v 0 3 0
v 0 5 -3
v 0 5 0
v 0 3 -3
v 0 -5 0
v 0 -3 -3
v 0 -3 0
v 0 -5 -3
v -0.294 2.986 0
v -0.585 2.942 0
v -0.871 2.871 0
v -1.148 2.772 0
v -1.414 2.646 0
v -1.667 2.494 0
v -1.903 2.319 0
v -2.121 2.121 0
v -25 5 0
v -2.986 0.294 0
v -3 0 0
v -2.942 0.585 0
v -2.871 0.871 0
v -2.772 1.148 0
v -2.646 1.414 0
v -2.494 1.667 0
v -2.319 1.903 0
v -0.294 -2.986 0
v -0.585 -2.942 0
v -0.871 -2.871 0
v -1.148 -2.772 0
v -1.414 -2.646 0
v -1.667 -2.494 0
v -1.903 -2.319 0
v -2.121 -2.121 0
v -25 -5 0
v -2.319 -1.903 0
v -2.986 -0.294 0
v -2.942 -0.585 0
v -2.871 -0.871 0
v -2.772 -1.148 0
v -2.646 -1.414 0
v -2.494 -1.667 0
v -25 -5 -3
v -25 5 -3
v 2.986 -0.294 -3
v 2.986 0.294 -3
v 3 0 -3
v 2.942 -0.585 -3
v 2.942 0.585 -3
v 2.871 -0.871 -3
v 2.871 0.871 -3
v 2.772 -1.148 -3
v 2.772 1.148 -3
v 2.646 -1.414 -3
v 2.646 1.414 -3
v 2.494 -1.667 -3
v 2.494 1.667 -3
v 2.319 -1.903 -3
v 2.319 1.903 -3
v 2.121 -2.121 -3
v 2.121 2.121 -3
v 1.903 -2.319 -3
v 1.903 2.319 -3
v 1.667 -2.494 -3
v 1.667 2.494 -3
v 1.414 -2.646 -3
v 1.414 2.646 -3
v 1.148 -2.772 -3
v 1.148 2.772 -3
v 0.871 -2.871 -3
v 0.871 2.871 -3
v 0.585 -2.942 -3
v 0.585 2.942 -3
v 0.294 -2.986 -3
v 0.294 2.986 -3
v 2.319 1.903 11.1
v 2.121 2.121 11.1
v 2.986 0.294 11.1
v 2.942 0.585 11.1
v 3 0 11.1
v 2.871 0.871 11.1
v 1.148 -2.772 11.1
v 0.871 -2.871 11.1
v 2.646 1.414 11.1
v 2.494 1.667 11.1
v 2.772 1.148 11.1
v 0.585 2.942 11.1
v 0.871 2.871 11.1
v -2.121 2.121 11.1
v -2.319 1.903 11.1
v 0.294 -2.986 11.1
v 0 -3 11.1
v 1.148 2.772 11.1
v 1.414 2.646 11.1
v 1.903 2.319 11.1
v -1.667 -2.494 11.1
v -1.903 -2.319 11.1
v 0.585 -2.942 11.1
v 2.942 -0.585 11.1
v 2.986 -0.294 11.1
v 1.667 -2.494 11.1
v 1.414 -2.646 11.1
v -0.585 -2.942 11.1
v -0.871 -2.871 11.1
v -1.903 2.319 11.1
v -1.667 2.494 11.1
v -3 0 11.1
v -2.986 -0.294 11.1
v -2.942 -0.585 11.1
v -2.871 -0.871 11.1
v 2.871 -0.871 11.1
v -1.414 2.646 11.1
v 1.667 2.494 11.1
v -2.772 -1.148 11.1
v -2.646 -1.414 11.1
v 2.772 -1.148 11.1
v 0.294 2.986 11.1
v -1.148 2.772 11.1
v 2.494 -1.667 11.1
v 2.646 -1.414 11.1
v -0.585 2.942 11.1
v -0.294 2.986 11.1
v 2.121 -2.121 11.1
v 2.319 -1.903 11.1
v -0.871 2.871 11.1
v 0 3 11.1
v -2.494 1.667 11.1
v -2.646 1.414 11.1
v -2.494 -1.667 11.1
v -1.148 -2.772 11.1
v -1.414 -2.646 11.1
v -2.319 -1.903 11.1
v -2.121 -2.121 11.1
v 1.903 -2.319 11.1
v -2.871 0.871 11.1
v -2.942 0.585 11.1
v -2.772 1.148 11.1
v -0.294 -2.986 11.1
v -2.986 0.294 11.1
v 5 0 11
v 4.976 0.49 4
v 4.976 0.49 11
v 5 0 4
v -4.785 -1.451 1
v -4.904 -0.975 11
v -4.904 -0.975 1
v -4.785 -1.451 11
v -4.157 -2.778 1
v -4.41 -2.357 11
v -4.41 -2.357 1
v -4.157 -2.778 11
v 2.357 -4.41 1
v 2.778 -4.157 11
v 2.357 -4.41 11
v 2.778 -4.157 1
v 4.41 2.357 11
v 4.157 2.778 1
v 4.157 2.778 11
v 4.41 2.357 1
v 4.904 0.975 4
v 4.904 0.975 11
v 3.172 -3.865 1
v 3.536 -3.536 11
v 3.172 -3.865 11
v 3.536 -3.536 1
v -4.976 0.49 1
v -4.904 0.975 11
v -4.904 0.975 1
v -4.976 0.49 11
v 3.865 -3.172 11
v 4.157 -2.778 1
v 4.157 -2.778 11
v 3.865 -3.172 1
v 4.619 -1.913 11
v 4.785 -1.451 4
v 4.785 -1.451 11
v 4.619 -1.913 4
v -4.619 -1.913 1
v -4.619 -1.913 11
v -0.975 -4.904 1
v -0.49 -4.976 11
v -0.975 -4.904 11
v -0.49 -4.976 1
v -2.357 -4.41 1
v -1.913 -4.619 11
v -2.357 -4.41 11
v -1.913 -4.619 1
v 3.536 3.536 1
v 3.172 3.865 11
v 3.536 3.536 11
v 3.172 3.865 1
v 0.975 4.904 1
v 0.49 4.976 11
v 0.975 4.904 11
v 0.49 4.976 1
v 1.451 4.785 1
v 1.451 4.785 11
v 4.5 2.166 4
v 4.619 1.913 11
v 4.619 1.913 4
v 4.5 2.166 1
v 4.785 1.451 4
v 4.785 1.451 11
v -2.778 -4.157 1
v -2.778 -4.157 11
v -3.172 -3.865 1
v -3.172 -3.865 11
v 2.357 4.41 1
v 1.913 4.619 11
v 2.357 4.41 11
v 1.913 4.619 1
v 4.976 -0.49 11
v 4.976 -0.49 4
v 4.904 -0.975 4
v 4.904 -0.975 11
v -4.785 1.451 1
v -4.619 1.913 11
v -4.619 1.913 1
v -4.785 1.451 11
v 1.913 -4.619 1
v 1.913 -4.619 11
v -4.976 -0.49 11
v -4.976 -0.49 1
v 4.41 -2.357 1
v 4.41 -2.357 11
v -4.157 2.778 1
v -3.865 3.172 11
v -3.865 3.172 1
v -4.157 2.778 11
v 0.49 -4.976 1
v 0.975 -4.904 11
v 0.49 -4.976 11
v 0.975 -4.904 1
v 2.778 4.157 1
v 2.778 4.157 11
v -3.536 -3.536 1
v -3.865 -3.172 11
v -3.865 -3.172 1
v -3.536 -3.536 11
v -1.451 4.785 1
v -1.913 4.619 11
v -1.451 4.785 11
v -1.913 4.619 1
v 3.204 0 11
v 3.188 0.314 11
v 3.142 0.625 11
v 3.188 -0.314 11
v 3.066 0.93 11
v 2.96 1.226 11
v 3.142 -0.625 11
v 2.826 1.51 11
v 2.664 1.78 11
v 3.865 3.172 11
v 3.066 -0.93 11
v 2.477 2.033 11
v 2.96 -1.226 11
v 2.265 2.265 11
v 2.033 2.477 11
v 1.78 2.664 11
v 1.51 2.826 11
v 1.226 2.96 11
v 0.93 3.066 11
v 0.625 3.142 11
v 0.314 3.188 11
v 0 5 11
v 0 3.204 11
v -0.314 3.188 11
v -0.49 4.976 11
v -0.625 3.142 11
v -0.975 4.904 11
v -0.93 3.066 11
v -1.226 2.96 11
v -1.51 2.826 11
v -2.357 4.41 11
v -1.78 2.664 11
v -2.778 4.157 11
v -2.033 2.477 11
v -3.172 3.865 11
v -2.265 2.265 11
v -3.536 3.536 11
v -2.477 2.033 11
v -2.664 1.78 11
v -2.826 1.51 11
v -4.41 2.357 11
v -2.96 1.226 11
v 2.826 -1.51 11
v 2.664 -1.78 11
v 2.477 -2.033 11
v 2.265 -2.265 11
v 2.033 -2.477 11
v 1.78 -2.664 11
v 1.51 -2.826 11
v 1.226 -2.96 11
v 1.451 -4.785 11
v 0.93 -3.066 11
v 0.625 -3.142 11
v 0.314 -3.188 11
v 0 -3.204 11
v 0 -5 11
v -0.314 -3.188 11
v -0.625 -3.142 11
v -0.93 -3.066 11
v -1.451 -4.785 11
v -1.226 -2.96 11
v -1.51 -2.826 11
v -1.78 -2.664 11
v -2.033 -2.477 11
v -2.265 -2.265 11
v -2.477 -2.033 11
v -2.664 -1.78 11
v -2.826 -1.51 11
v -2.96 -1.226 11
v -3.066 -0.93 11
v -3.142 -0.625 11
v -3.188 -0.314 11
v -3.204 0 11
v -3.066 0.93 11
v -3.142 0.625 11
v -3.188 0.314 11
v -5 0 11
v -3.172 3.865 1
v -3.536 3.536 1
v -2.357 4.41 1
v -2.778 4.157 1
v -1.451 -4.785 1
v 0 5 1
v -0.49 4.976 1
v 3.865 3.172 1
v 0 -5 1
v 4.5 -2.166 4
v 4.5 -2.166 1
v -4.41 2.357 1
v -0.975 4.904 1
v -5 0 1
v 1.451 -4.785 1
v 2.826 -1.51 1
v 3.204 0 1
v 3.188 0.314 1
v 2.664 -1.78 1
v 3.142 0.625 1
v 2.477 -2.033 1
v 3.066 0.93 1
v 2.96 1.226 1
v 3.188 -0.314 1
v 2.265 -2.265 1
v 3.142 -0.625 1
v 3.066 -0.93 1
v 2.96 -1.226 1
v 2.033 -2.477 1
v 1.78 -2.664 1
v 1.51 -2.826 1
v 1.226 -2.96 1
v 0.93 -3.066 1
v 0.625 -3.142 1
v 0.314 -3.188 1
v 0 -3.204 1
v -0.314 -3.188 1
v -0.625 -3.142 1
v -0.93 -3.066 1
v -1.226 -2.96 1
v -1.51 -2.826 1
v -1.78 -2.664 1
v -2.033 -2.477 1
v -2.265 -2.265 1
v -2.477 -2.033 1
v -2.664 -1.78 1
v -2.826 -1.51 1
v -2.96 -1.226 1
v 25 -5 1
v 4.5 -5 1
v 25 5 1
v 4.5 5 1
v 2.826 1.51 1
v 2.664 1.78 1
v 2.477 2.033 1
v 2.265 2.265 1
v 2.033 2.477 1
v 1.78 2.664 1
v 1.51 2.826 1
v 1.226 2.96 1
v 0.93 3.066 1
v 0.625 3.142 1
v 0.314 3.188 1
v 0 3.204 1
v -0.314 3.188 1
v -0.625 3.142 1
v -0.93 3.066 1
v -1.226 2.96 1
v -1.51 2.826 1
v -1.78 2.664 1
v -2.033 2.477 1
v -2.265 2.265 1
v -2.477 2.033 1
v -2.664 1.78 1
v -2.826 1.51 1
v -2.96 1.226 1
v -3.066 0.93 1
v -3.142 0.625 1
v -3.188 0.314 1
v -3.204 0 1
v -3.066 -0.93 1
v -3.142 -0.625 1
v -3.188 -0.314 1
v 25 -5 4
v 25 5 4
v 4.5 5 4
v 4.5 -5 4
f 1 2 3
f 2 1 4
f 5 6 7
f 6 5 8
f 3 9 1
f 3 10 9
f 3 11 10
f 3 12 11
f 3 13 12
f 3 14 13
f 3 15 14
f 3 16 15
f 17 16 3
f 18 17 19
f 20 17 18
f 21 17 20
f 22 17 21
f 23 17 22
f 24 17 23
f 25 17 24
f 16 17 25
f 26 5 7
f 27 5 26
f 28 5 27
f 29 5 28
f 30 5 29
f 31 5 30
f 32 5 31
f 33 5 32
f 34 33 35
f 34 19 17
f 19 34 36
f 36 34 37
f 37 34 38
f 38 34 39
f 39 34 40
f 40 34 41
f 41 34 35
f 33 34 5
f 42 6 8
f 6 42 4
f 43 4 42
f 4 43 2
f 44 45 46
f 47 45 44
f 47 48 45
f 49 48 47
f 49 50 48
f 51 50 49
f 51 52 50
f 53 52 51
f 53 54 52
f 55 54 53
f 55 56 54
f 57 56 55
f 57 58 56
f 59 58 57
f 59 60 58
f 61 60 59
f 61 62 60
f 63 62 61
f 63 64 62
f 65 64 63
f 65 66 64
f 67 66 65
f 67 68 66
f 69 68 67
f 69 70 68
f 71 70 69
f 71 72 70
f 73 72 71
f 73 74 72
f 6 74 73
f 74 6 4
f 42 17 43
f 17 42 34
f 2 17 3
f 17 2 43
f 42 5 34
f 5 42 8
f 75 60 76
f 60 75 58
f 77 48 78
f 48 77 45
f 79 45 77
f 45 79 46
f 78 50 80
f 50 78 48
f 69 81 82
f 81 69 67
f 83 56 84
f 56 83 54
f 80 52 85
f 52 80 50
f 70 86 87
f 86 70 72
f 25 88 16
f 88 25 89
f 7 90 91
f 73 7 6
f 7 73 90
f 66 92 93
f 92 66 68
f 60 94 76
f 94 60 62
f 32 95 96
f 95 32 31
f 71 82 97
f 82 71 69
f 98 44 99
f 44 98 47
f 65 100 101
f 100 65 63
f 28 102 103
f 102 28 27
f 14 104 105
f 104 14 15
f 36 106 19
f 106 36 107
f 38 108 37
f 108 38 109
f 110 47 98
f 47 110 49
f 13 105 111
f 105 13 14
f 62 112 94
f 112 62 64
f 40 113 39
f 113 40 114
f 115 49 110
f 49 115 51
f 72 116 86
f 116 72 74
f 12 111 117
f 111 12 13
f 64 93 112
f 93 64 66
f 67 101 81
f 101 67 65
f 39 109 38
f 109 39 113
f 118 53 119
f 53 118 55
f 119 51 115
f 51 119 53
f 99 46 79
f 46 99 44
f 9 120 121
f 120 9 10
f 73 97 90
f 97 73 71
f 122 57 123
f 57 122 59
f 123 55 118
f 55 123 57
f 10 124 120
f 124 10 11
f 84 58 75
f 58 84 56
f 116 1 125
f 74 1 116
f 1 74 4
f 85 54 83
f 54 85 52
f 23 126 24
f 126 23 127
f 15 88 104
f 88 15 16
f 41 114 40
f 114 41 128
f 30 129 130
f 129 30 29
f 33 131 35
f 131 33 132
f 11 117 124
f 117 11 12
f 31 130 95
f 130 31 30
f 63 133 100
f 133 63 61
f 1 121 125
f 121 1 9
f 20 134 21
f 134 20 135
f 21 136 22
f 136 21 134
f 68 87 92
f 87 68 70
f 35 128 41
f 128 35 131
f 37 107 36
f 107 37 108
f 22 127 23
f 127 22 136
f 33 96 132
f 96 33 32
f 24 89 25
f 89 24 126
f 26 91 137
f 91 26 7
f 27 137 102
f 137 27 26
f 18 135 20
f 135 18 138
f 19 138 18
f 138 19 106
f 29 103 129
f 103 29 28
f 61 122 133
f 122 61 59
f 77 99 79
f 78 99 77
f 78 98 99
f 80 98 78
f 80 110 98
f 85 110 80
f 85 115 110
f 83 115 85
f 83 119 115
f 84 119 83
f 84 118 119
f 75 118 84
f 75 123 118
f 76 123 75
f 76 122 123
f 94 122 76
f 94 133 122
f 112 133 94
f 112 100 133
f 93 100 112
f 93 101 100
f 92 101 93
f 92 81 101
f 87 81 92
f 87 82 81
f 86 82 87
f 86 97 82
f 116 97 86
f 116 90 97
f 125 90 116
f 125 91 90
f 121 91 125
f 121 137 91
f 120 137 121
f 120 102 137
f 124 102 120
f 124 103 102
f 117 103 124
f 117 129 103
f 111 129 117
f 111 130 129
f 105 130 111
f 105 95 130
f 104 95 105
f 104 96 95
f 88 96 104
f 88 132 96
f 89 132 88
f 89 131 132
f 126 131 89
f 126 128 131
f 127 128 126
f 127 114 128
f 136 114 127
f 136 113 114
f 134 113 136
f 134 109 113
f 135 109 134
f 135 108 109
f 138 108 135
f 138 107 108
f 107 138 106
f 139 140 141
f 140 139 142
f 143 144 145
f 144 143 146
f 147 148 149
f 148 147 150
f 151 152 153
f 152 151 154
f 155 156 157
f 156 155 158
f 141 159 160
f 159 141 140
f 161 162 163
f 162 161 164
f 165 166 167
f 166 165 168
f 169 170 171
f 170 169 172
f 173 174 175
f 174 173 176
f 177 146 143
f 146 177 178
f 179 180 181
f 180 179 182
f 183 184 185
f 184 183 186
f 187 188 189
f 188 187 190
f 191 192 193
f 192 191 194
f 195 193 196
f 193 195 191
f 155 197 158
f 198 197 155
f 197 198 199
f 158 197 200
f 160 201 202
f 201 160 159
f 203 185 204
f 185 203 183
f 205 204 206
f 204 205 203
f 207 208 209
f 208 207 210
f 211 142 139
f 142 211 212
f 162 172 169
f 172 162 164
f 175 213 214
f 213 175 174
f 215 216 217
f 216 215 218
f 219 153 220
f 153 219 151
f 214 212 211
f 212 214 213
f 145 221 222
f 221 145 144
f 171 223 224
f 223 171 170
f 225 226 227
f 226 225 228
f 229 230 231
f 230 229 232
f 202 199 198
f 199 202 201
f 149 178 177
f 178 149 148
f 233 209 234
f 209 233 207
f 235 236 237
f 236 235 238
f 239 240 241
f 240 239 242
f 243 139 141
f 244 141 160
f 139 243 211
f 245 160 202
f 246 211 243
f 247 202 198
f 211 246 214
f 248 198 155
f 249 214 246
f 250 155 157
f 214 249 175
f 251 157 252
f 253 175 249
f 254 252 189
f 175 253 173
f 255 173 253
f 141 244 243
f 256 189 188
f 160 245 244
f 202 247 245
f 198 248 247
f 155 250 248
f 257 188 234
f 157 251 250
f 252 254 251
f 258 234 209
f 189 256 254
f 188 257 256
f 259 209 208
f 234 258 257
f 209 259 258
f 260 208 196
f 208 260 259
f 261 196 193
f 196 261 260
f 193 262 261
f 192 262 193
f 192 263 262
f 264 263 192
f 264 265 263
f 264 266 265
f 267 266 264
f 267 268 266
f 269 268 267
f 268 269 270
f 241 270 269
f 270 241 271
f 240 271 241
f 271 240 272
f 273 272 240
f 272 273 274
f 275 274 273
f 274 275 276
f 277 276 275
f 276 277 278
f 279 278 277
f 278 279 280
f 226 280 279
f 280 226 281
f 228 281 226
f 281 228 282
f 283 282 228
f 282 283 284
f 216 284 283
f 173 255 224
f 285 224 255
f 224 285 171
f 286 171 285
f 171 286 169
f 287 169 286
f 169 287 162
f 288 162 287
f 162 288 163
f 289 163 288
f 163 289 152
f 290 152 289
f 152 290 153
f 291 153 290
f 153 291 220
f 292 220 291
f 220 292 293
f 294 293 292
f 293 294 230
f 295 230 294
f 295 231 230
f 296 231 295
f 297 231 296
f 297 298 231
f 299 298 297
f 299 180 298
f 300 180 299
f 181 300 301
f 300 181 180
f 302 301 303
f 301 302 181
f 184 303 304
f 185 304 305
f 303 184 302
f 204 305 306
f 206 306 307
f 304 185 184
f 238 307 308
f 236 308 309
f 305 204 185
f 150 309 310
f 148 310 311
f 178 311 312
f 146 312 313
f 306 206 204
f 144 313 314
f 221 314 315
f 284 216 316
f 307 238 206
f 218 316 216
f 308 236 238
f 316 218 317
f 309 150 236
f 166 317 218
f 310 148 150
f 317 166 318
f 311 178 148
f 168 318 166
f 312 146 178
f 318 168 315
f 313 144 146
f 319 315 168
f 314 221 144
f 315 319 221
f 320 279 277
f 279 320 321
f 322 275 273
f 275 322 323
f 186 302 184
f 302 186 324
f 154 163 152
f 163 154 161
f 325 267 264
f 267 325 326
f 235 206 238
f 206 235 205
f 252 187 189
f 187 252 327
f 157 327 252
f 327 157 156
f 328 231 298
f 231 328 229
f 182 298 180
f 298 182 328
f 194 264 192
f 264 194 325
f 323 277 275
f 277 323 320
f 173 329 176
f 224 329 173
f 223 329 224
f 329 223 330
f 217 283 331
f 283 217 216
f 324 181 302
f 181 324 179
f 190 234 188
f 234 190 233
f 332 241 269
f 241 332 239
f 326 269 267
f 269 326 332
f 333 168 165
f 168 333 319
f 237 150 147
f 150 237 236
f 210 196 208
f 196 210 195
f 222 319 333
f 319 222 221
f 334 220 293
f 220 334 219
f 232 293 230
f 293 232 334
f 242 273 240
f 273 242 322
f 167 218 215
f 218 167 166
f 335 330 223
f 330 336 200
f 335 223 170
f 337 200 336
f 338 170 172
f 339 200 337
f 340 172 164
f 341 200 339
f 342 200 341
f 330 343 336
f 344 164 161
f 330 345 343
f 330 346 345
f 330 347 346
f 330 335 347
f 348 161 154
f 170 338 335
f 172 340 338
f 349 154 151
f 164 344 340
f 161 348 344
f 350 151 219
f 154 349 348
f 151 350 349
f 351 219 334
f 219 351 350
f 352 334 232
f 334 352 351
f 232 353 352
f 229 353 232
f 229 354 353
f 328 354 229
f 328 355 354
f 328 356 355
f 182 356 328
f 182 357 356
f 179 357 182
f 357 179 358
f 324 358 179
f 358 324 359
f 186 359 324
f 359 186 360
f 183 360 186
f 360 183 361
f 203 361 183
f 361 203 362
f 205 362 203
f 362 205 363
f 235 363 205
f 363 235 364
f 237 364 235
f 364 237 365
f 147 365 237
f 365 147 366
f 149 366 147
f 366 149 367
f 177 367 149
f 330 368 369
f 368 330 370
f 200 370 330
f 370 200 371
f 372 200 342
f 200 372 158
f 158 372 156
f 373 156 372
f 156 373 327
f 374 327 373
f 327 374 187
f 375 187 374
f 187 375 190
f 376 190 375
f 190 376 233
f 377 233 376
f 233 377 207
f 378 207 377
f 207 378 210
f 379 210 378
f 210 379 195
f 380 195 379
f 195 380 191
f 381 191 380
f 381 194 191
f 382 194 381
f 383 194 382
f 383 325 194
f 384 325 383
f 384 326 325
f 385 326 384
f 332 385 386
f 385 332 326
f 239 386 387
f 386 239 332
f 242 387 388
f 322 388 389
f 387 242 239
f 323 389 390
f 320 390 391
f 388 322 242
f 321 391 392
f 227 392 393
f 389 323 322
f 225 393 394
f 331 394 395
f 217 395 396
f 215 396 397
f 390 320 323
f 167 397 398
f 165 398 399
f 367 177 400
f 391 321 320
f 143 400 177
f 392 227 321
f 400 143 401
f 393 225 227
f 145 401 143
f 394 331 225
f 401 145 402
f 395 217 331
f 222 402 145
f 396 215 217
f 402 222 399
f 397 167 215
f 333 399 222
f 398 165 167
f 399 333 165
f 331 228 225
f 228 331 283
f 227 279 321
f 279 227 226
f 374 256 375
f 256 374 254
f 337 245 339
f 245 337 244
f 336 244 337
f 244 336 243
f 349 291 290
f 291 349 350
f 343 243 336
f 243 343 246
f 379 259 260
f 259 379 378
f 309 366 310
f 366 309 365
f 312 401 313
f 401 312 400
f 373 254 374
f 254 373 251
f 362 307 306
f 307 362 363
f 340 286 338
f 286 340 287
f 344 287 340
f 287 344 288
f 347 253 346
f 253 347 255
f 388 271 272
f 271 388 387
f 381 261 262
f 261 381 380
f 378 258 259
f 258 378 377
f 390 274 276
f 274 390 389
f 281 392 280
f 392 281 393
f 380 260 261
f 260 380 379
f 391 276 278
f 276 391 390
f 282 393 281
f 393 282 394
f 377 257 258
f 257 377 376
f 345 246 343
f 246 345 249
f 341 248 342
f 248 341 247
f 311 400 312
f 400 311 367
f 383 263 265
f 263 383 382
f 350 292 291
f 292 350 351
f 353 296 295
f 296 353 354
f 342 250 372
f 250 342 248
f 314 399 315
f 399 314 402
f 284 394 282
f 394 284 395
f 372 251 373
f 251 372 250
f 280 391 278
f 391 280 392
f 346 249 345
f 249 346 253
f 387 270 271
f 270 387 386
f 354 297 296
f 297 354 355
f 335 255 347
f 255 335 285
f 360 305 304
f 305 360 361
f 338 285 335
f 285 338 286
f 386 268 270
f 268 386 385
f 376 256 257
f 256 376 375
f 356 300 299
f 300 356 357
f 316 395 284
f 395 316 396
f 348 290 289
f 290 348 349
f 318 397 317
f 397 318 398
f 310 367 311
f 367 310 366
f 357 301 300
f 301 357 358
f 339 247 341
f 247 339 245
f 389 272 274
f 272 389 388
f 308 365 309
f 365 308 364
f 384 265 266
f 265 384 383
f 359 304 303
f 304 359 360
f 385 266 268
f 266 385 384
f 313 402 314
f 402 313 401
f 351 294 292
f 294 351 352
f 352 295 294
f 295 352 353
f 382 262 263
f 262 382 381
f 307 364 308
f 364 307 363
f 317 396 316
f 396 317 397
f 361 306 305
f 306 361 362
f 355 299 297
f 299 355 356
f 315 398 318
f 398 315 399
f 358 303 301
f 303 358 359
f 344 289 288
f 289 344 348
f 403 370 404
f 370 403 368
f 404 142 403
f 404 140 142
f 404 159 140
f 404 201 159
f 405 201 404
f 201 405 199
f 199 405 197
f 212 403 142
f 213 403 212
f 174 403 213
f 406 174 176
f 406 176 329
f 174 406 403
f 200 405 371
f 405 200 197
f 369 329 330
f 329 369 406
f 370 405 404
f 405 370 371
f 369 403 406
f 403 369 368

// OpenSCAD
// Adversarial: a correct hinge that ignores its own pose control.
// Every geometric check passes, because the benchmark can rotate the moving
// part itself. What fails is `source-motion`: re-rendering at hinge_angle
// produces byte-identical geometry, so the source is a static model that only
// looks kinematic when someone else moves it.
agentscad_part = "all";
hinge_angle = 0;   // declared, but never used
$fn = 64;

bore_d = 6.40 / cos(180 / $fn);

module fixed_leaf() {
  union() {
    translate([-25, -5, -3]) cube([25, 10, 3]);
    translate([0, 0, -3]) cylinder(h = 14.1, d = 6);
  }
}

module moving_leaf() {
  union() {
    difference() {
      translate([0, 0, 1]) cylinder(h = 10, d = 10);
      translate([0, 0, 0.9]) cylinder(h = 10.2, d = bore_d);
    }
    translate([4.5, -5, 1]) cube([20.5, 10, 3]);
  }
}

module generated_part() {
  if (agentscad_part == "all" || agentscad_part == "fixed") fixed_leaf();
  if (agentscad_part == "all" || agentscad_part == "moving") moving_leaf();
}

generated_part();
